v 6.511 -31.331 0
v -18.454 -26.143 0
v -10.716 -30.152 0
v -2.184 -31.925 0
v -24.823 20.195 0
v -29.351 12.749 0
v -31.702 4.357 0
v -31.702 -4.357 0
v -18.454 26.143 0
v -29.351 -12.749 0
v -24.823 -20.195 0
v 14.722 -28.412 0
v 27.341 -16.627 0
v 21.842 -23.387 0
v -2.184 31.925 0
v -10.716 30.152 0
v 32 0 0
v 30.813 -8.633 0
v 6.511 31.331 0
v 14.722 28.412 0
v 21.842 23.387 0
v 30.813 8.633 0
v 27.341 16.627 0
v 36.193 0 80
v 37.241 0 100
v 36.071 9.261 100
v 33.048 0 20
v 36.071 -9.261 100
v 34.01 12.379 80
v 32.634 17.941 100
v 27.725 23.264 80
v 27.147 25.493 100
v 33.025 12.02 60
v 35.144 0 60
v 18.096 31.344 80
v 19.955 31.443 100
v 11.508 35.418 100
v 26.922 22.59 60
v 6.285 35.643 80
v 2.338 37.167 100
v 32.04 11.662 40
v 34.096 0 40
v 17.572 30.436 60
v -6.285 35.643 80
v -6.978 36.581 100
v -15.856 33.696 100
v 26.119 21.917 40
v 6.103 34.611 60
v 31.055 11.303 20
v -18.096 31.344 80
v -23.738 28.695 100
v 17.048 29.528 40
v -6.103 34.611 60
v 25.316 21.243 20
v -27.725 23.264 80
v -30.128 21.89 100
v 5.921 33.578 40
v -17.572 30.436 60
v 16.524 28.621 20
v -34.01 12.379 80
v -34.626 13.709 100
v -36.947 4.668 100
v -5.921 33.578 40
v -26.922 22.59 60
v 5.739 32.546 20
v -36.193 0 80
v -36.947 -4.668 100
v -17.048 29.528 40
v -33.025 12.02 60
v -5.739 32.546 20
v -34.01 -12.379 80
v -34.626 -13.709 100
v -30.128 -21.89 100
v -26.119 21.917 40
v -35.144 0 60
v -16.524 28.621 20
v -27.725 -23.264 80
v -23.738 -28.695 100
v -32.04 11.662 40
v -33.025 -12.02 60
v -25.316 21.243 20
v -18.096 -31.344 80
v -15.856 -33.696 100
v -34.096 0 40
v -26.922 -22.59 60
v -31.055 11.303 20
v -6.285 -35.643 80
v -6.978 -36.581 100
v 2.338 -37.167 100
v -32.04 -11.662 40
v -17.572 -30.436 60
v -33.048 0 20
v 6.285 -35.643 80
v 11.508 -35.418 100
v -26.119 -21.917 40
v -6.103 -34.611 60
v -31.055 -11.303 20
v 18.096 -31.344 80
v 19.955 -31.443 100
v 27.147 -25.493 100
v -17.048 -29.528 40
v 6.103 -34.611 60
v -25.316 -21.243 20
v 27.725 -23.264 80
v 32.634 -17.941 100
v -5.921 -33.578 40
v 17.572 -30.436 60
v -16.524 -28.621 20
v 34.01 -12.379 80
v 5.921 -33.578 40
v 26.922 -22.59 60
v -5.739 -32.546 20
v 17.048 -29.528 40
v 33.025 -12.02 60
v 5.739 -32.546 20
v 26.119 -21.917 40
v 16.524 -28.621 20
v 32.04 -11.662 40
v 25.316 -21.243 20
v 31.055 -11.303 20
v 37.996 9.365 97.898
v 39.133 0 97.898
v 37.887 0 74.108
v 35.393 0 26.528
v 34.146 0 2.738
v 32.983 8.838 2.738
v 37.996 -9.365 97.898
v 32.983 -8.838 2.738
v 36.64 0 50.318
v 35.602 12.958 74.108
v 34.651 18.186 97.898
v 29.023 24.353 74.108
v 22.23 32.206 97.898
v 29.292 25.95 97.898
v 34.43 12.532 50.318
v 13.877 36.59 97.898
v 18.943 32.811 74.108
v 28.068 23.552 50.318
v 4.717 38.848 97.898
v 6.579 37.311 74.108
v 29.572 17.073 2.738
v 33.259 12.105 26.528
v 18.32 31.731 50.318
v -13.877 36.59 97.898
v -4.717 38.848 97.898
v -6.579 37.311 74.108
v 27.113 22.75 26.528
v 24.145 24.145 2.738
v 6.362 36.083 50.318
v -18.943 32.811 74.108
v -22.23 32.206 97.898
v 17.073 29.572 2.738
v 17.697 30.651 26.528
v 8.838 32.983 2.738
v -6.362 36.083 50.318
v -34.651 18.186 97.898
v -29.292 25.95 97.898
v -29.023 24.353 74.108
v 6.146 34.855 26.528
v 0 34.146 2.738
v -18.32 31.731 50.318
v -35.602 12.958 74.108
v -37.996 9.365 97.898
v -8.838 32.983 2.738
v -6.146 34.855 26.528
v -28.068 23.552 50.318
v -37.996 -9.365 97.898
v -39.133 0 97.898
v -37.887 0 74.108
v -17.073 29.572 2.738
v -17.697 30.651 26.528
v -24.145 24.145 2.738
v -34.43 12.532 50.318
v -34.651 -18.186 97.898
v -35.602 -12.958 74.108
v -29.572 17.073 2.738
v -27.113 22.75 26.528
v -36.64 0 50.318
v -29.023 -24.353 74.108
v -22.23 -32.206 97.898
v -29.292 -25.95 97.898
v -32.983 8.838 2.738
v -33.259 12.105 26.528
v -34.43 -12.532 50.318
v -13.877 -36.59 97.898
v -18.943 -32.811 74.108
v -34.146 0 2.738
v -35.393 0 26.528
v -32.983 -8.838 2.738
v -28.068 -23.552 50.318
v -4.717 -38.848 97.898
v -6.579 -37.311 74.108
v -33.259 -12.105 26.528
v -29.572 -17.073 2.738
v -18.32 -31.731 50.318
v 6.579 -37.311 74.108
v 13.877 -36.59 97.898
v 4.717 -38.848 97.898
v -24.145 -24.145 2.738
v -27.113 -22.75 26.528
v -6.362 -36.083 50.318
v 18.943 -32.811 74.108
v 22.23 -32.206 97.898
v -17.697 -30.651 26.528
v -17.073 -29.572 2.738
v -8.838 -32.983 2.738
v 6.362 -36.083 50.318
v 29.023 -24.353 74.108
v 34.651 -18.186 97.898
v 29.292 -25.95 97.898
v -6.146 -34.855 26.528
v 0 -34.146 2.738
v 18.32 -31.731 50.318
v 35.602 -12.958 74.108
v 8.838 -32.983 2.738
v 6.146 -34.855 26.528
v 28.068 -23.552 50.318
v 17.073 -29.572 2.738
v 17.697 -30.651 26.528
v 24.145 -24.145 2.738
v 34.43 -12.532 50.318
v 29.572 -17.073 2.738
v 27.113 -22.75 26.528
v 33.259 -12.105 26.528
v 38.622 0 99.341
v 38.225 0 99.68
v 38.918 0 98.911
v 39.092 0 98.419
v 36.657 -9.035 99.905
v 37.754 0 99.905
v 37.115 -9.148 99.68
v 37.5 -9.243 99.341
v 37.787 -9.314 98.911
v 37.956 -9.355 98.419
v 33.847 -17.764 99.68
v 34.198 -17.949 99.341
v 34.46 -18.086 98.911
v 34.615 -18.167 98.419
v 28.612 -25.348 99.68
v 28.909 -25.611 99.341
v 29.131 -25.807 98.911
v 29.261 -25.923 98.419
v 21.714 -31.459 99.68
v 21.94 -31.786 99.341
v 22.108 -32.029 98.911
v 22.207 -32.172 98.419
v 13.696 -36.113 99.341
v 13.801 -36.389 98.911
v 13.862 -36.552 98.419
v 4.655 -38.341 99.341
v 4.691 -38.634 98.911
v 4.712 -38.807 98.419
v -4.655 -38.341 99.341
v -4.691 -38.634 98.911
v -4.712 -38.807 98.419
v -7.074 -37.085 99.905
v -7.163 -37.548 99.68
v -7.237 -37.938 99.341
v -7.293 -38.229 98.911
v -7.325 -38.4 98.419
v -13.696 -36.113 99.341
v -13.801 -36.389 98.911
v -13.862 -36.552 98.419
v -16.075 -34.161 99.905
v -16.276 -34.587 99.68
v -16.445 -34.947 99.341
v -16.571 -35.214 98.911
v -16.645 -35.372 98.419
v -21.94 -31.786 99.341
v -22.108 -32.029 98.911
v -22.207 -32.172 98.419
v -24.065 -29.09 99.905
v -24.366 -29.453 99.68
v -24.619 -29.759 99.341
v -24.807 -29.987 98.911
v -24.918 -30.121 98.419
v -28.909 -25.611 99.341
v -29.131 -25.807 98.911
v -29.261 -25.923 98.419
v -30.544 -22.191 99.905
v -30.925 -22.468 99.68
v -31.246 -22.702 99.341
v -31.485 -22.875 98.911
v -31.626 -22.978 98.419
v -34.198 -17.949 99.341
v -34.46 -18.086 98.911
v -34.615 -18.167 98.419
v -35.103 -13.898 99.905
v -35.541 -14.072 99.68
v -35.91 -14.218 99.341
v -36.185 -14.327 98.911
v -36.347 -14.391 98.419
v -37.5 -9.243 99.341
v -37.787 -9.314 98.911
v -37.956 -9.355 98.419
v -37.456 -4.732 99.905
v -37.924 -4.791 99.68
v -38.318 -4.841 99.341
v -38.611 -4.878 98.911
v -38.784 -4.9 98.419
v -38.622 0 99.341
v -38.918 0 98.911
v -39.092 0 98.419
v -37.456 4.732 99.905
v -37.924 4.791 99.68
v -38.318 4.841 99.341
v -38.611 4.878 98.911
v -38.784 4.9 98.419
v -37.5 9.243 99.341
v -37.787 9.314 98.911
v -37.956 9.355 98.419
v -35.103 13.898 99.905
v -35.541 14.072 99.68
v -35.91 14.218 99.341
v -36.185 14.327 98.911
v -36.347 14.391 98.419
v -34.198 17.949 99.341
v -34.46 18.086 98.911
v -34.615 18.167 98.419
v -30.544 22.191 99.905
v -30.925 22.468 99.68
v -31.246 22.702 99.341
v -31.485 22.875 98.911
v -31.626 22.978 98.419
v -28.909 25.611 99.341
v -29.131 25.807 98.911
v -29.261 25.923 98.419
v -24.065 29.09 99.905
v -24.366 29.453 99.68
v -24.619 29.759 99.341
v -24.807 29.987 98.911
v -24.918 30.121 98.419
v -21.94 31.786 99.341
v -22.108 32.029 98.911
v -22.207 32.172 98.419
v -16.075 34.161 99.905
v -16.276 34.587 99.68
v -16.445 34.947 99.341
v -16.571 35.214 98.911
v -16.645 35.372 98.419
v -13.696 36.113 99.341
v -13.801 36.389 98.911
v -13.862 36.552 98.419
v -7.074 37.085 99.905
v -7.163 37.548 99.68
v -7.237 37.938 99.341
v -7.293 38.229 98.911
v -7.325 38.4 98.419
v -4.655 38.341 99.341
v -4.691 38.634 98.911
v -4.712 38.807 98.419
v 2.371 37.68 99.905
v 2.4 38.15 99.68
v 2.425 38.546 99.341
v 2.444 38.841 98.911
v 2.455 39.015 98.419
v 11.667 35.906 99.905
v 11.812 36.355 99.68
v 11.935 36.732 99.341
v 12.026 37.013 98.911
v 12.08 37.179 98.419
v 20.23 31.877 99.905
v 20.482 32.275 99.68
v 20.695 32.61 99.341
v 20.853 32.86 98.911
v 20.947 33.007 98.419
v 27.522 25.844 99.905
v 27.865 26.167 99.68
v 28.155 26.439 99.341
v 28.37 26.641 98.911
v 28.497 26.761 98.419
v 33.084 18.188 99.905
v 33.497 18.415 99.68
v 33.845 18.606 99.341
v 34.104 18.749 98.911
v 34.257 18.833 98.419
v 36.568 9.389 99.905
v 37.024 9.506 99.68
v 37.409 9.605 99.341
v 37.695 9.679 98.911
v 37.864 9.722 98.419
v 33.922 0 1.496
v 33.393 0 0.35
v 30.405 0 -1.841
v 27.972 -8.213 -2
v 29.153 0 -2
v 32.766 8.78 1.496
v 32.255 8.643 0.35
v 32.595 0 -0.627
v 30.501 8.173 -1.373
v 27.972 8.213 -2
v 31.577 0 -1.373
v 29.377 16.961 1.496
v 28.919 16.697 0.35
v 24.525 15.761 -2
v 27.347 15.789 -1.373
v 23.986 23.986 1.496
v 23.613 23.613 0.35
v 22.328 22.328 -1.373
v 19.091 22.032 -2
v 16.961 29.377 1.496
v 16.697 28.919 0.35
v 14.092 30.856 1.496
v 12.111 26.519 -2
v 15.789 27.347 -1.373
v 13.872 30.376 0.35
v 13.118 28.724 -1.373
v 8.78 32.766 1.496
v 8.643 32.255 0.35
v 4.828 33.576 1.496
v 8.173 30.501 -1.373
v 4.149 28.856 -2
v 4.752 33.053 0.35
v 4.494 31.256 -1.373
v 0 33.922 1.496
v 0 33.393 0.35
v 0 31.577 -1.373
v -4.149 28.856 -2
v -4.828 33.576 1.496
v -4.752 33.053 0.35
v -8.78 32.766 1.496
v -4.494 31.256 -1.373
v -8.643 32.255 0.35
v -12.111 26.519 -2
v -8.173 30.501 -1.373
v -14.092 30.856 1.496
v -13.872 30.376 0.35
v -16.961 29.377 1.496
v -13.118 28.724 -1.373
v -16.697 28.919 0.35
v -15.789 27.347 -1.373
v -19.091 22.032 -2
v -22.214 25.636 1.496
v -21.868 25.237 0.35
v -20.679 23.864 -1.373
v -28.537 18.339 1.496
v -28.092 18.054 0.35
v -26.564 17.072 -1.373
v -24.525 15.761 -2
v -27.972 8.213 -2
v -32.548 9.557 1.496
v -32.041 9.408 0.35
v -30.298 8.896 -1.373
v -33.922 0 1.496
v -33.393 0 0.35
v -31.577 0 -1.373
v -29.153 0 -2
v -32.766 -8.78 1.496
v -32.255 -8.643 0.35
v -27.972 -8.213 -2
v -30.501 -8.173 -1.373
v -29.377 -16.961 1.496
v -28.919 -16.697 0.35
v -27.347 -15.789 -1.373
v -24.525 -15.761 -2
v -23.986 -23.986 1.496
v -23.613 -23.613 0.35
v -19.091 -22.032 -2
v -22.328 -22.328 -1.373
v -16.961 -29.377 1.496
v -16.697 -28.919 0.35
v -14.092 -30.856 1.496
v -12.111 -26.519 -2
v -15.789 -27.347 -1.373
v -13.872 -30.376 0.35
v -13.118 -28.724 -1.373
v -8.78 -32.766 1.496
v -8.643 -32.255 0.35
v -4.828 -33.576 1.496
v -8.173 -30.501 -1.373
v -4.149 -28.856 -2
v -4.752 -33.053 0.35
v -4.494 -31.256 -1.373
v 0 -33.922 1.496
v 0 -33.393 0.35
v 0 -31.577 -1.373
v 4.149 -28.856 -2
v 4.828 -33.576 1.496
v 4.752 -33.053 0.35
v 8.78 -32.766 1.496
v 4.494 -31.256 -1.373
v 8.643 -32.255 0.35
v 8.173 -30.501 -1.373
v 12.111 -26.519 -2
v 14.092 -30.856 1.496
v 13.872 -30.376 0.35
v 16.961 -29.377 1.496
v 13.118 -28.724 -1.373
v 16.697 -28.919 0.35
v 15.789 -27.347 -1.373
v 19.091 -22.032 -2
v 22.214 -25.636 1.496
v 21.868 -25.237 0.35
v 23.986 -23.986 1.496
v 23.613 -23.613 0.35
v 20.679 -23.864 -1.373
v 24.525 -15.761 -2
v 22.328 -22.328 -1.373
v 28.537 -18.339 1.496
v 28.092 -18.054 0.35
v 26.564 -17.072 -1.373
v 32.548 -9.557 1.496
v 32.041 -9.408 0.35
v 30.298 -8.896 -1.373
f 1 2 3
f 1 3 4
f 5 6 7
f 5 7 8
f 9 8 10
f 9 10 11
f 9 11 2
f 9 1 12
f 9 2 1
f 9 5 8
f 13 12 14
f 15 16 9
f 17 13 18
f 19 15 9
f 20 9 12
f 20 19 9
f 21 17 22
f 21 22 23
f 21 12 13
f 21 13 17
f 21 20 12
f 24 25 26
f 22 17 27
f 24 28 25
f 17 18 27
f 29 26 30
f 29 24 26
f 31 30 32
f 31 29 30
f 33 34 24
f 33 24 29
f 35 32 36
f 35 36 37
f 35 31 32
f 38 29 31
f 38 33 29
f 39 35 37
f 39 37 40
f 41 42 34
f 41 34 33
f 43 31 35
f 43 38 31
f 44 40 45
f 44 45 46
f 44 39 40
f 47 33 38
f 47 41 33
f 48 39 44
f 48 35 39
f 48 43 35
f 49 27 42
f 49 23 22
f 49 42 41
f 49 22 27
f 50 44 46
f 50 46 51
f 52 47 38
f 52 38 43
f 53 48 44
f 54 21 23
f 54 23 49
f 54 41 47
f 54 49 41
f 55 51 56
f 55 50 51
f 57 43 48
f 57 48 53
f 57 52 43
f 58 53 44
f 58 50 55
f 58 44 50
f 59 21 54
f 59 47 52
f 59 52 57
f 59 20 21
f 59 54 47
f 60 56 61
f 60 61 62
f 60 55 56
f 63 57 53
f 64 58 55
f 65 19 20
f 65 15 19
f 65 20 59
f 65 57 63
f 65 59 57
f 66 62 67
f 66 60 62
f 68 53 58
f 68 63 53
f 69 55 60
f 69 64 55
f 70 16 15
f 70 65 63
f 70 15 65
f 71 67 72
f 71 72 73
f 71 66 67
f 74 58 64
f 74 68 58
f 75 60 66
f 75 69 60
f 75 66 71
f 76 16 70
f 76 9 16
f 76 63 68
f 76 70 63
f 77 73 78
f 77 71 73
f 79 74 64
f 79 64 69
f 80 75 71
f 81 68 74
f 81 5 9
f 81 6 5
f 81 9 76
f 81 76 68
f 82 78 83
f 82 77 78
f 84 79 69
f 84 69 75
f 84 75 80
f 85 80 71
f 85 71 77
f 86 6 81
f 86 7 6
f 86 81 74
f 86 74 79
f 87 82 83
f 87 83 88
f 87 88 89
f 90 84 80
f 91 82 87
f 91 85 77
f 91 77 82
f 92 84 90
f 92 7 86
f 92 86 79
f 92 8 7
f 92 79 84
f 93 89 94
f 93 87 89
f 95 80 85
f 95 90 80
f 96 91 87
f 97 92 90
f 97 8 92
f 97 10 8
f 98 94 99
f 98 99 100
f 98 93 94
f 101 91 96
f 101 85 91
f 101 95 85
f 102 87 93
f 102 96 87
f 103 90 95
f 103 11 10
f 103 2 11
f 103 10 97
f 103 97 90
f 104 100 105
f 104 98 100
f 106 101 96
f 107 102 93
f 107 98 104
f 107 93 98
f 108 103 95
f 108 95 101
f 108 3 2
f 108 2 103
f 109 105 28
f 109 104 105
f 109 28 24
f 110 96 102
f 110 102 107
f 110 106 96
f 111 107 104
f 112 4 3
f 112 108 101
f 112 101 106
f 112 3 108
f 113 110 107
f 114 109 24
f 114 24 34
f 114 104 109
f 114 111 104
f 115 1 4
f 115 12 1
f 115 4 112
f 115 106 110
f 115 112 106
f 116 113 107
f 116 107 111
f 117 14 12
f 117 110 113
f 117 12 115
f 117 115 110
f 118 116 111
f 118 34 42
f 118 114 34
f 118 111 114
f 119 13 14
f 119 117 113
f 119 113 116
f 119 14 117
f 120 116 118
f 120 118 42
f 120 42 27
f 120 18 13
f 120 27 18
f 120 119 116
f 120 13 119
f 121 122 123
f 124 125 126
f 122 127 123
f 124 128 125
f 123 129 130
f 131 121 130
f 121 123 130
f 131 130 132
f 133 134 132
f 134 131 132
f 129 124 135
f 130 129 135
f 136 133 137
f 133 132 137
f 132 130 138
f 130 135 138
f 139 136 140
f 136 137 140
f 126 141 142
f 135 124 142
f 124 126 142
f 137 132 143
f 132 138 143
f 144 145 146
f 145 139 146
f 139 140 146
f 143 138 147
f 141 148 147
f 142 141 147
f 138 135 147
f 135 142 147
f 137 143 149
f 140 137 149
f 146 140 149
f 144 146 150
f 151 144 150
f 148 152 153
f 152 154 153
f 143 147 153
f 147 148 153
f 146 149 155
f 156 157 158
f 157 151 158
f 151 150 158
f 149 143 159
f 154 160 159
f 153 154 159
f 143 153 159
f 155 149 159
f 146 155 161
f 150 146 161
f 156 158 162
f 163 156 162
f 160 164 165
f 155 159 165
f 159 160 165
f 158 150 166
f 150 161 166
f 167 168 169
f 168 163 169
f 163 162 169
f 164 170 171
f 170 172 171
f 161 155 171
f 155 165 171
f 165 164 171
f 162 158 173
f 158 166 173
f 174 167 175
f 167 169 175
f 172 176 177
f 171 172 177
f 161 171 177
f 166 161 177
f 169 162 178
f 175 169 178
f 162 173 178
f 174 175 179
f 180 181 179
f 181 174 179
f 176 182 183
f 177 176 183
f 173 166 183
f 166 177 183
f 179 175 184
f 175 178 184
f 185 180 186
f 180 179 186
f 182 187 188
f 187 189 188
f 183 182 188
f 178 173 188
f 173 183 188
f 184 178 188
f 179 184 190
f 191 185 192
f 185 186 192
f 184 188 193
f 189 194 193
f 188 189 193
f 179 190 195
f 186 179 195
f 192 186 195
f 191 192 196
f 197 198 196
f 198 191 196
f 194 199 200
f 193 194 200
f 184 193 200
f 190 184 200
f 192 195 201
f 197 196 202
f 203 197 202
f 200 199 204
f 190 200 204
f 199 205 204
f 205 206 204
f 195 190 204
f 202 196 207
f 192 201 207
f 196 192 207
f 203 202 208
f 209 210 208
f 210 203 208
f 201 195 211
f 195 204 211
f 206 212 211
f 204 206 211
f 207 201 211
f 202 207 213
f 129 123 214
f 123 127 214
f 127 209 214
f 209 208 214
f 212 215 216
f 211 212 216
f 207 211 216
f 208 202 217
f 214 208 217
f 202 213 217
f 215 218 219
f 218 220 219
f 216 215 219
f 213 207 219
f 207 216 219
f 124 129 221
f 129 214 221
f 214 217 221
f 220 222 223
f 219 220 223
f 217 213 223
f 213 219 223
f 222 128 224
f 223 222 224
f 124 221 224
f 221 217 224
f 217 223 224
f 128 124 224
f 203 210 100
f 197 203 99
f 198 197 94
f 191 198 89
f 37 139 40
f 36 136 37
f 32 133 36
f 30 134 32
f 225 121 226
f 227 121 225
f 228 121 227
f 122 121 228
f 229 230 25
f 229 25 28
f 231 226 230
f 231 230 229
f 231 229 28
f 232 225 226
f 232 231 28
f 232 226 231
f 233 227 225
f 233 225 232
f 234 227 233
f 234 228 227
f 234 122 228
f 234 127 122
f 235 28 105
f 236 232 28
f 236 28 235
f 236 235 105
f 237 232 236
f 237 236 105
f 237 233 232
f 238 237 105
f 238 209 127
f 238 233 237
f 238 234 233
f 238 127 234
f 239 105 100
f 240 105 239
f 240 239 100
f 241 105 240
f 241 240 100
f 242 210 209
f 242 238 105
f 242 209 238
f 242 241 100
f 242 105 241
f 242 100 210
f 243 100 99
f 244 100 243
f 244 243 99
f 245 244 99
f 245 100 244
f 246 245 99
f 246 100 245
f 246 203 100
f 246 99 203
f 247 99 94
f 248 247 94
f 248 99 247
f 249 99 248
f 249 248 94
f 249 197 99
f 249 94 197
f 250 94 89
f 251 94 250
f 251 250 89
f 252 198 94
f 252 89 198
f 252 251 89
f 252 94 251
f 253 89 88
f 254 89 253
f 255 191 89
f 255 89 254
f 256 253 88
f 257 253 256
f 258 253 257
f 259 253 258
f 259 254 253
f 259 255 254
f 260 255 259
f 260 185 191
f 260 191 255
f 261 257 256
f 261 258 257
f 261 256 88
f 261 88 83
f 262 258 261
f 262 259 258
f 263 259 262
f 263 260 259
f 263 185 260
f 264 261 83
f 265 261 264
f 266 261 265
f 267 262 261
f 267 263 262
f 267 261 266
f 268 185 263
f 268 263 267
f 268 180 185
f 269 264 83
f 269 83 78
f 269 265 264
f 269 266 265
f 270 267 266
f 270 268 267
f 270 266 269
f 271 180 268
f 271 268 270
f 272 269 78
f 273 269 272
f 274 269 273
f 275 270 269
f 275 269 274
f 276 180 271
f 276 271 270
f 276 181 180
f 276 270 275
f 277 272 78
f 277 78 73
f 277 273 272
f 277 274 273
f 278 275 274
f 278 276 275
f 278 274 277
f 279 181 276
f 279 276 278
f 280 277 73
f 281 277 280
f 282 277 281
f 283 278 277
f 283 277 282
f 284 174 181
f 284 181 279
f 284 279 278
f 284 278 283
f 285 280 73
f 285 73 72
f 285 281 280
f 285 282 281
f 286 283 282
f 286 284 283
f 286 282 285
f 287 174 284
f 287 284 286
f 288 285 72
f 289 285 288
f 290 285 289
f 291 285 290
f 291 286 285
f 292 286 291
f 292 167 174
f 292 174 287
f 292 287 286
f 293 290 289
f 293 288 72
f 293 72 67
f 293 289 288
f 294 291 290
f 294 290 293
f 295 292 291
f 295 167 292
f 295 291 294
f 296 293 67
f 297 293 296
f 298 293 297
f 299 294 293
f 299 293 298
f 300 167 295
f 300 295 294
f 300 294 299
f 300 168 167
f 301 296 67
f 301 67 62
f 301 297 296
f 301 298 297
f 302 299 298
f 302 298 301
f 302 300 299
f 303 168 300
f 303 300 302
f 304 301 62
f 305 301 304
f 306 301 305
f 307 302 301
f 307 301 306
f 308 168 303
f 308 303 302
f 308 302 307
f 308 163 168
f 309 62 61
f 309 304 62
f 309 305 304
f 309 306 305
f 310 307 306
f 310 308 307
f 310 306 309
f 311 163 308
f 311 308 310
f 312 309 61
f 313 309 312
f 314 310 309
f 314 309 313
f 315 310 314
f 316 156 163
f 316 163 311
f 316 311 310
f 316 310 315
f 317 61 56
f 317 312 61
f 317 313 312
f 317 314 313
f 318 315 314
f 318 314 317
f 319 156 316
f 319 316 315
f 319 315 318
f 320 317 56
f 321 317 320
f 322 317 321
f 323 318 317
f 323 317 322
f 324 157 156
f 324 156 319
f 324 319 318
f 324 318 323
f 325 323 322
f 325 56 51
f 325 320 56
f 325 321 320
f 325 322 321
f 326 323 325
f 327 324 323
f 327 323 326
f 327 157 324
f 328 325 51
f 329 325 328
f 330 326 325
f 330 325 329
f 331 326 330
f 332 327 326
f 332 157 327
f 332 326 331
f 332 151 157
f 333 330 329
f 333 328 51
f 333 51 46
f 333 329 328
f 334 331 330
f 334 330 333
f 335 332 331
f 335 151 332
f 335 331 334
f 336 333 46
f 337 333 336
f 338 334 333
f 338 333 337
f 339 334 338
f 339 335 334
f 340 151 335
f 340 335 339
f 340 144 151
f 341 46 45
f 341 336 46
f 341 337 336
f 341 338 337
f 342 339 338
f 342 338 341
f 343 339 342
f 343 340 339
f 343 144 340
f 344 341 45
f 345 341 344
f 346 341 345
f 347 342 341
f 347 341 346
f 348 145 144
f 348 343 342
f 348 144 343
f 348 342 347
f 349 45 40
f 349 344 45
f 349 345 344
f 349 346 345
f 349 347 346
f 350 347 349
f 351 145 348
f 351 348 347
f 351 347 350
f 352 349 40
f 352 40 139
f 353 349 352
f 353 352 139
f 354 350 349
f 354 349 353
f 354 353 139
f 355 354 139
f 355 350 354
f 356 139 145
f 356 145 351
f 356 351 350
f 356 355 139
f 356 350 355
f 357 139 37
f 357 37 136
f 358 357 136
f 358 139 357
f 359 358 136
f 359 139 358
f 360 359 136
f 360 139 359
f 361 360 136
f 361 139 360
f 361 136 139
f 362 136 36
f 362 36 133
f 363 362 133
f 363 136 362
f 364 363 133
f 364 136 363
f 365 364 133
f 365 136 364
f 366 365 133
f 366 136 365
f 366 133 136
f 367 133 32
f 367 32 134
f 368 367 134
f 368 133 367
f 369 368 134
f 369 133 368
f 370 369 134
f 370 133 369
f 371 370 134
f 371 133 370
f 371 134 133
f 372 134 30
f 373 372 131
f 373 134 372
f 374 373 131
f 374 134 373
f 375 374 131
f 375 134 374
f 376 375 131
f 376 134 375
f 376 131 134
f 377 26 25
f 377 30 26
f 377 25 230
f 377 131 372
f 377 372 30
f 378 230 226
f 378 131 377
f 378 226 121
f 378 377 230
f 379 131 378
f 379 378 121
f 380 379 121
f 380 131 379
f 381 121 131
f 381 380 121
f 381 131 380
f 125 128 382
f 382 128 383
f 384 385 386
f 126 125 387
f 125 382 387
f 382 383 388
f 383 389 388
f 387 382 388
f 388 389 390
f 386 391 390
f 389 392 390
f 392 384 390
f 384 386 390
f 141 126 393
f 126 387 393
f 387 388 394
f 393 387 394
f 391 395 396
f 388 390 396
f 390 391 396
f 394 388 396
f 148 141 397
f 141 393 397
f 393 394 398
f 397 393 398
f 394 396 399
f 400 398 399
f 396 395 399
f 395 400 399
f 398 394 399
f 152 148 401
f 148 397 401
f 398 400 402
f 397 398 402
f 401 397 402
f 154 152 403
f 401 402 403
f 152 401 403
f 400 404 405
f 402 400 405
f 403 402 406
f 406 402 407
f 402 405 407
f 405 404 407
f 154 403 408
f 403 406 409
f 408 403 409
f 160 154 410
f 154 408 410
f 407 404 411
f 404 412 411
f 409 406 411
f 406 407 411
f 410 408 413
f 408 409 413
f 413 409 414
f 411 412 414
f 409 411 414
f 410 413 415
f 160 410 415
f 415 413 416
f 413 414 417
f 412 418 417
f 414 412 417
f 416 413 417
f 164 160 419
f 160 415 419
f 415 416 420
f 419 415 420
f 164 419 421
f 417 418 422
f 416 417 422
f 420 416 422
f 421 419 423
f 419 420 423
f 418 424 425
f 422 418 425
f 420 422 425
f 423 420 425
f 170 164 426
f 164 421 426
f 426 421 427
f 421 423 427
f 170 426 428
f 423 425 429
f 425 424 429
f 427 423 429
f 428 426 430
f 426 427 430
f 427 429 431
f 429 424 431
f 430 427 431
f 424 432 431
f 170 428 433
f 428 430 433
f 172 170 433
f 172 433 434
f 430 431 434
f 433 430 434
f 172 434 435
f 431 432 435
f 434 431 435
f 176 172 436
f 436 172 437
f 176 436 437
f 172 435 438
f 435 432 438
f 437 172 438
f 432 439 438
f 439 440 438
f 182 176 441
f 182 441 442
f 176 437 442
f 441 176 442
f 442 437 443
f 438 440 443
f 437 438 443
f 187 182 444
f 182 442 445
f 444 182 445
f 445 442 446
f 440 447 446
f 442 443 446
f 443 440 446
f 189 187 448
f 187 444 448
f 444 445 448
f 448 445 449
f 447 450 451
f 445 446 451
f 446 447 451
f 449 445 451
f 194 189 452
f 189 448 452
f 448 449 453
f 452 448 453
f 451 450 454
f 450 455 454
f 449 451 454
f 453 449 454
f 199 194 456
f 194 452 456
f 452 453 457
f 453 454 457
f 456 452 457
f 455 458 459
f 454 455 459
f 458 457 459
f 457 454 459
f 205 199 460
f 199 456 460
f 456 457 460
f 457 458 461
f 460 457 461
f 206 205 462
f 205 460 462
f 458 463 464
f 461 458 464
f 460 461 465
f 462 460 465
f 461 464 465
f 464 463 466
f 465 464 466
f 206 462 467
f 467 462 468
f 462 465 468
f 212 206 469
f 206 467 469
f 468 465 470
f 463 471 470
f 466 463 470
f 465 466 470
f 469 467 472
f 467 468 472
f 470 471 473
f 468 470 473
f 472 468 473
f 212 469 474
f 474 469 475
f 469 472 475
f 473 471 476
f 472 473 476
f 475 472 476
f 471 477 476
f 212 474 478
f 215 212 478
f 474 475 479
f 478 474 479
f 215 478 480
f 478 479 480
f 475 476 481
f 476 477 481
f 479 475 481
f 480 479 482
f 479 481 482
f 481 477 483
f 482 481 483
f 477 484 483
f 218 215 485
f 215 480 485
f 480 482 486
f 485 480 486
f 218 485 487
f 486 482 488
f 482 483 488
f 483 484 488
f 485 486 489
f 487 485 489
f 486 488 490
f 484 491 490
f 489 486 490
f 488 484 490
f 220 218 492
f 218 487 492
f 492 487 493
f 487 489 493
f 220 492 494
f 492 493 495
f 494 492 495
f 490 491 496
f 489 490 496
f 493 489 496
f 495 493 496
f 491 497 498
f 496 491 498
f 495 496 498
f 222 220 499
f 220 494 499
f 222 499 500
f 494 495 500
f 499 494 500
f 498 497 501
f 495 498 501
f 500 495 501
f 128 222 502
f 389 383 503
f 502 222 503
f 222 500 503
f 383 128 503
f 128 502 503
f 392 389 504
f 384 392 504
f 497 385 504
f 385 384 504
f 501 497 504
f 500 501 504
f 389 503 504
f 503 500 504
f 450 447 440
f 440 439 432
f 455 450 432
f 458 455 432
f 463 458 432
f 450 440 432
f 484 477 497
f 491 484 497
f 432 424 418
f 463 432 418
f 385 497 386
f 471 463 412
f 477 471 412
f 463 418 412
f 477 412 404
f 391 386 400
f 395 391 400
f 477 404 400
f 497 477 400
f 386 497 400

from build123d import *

# Parameters (mm, degrees)
ESQUISSE1_R        = 32
BOSS_EXTRU_1_DEPTH = 100
BOSS_EXTRU_1_DRAFT = -3
COQUE3_T           = 2
CONG_7_R           = 2


with BuildPart() as part:
    # Esquisse1 → Boss.-Extru.1 (with draft: the straight prism first)
    with BuildSketch(Plane.XY):
        Circle(ESQUISSE1_R)
    extrude(amount=BOSS_EXTRU_1_DEPTH)
    # Boss.-Extru.1: the draft: its side faces are tilted about the plane it starts from
    boss_extru_1_sides = [part.faces().sort_by_distance(p)[0] for p in [
        (-32, 0, 50),
    ]]
    draft(boss_extru_1_sides, Plane.XY, BOSS_EXTRU_1_DRAFT)

    # Coque3
    coque3_openings = [part.faces().sort_by_distance(p)[0] for p in [
        (0, 0, 100),
    ]]
    offset(amount=COQUE3_T, openings=coque3_openings, kind=Kind.INTERSECTION)

    # Congé6: read off the stored shape, not the designer's step
    # Congé6 outline → Congé6 (revolve, cut)
    with BuildSketch(Plane.XZ):
        with BuildLine():
            ThreePointArc((34.146253974, 2.738320219), (32.594879178, -0.626871855), (29.1531063, -2))
            Line((29.1531063, -2), (34.146253974, -2))
            Line((34.146253974, -2), (34.146253974, 2.738320219))
        make_face()
    revolve(axis=Axis((0, 0, 0), (0, 0, 1)), mode=Mode.SUBTRACT)

    # Congé7
    # the kernel refuses this fillet: 2 mm, written as the material it takes off along each edge
    with BuildSketch(Plane(origin=(0, 0, 100), x_dir=(1, 0, 0), z_dir=(0, 1, 0))) as cong_7_piece_1:
        with BuildLine():
            CenterArc((37.136106016, 1.99725907), CONG_7_R, 273, 90)
            Line((39.133365085, 2.101930982), (39.173310267, 2.10402442))
            Line((39.173310267, 2.10402442), (39.283467802, 0.002093438))
            Line((39.283467802, 0.002093438), (39.24352262, -0.04))
            ThreePointArc((39.24352262, -0.04), (38.242150274, -0.04), (37.242871367, -0.039945181))
            Line((37.242871367, -0.039945181), (37.240777928, 0))
        make_face()
    revolve(axis=Axis((0, 0, 100), (0, 0, -1)), mode=Mode.SUBTRACT)


solid = part.part
